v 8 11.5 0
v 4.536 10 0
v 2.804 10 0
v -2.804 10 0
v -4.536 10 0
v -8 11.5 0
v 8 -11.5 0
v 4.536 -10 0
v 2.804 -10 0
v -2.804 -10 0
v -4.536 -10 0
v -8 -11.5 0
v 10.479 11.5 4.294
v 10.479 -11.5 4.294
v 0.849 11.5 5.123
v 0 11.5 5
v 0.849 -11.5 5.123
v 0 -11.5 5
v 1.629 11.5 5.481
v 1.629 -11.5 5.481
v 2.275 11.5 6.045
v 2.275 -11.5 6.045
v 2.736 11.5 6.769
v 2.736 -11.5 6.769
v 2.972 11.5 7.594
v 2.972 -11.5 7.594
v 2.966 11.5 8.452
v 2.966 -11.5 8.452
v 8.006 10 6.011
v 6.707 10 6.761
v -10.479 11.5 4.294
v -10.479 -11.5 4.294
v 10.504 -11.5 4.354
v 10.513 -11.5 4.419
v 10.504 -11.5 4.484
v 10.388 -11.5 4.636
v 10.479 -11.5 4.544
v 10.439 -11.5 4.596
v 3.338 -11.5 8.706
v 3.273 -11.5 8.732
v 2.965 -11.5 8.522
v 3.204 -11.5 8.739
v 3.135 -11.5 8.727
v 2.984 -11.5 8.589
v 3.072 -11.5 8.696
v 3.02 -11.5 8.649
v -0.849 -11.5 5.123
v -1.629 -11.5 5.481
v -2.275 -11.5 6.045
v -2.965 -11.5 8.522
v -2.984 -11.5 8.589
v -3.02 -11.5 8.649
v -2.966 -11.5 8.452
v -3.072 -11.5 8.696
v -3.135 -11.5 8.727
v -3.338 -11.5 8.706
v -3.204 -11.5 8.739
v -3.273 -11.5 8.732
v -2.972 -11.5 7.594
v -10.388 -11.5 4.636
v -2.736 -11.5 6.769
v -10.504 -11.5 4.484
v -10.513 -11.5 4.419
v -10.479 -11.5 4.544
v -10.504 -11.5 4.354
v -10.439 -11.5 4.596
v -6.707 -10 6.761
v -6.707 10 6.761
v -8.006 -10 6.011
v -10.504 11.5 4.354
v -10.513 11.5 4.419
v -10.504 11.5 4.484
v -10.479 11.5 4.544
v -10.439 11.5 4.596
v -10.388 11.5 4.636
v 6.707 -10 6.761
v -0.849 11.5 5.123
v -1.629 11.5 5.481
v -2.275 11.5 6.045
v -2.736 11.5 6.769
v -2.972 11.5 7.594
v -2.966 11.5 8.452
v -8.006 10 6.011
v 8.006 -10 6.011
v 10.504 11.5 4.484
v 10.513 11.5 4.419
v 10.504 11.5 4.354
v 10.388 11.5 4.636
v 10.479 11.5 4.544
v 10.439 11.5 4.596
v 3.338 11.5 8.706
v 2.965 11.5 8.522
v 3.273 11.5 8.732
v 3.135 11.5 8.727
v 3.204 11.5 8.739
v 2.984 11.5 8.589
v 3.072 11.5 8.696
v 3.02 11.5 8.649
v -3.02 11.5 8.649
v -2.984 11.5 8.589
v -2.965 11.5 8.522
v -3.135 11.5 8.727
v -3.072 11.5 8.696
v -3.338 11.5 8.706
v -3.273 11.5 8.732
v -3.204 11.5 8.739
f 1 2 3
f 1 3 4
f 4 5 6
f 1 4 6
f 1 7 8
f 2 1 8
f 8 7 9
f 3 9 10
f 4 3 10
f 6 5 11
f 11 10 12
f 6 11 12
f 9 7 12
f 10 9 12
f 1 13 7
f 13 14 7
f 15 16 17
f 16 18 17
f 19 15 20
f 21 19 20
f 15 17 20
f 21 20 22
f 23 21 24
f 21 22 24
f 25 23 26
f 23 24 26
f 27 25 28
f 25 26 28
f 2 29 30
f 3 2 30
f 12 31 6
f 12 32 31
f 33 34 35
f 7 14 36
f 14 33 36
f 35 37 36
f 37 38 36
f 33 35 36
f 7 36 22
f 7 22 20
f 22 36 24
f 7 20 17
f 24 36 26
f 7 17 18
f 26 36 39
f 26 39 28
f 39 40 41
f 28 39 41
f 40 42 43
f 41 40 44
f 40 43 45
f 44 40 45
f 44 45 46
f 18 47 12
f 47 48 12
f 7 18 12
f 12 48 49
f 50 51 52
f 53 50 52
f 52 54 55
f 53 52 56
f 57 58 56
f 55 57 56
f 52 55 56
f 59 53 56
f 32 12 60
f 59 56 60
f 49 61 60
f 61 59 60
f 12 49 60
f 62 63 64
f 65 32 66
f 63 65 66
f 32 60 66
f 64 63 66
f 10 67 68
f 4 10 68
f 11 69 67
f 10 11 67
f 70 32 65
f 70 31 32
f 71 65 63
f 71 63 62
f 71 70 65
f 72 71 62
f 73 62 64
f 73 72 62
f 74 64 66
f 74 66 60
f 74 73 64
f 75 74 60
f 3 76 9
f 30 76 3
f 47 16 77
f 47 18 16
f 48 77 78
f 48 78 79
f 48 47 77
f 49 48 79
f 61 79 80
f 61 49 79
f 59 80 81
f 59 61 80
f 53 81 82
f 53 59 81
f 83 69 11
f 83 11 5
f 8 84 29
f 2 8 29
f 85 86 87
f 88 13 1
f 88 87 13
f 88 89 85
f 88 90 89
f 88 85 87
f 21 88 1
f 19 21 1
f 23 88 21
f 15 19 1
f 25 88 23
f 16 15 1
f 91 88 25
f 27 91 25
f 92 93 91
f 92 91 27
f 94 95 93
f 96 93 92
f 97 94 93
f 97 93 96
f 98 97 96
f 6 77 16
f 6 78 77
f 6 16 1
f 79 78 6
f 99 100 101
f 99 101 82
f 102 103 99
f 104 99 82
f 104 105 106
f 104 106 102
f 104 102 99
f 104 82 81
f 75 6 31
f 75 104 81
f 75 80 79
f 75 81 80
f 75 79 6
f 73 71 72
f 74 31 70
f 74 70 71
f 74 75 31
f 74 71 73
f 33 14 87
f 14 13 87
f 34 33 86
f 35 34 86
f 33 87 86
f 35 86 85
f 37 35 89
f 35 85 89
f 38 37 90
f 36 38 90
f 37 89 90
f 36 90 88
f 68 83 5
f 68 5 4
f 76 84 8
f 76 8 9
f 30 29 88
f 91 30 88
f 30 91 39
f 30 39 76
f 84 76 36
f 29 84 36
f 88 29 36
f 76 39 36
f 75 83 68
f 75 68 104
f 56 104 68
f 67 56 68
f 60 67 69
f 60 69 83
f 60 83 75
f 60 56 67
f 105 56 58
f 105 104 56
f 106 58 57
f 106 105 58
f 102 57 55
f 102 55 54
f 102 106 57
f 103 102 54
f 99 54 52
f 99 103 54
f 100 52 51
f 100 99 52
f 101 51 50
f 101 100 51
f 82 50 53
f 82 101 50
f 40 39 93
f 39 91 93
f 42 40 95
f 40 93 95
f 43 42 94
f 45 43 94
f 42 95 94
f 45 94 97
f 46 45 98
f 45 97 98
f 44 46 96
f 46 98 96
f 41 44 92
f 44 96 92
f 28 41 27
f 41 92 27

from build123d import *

# Parameters (mm, degrees)
F2_DEPTH = 11.5
F4_W     = 1.5
F4_H     = 20
F5_DEPTH = 25
F6_R     = 0.25


with BuildPart() as f2:
    # F1 (on Front) → F2 (new body, symmetric)
    with BuildSketch(Plane.XZ):
        with BuildLine():
            Line((-10.6042210982, 4.5106432563), (-8, 0))
            Line((-8, 0), (0, 0))
            Line((0, 0), (0, 5))
            ThreePointArc((0, 5), (-2.4494897428, 6.2679491924), (-2.8284271247, 9))
            Line((-2.8284271247, 9), (-10.6042210982, 4.5106432563))
        make_face()
    extrude(amount=F2_DEPTH, both=True)

    # F4 (on offset) → F5 (cut)
    with BuildSketch(Plane(origin=(-4.6042210982, 0, 7.9747448714), x_dir=(0.8660254038, 0, 0.5), z_dir=(-0.5, 0, 0.8660254038))):
        with Locations((-3.1782032303, 0)):
            Rectangle(F4_W, F4_H)
    extrude(amount=-F5_DEPTH, mode=Mode.SUBTRACT)

    # F6
    f6_edges = [f2.edges().sort_by_distance(p)[0] for p in [
        (-10.604221, 0, 4.510643),
        (-2.828427, 0, 9),
    ]]
    fillet(f6_edges, radius=F6_R)

    # F7: F2 across plane


with BuildPart() as f2_1:
    add(f2.part)
    add(f2.part.mirror(Plane.YZ))


solid = f2_1.part
